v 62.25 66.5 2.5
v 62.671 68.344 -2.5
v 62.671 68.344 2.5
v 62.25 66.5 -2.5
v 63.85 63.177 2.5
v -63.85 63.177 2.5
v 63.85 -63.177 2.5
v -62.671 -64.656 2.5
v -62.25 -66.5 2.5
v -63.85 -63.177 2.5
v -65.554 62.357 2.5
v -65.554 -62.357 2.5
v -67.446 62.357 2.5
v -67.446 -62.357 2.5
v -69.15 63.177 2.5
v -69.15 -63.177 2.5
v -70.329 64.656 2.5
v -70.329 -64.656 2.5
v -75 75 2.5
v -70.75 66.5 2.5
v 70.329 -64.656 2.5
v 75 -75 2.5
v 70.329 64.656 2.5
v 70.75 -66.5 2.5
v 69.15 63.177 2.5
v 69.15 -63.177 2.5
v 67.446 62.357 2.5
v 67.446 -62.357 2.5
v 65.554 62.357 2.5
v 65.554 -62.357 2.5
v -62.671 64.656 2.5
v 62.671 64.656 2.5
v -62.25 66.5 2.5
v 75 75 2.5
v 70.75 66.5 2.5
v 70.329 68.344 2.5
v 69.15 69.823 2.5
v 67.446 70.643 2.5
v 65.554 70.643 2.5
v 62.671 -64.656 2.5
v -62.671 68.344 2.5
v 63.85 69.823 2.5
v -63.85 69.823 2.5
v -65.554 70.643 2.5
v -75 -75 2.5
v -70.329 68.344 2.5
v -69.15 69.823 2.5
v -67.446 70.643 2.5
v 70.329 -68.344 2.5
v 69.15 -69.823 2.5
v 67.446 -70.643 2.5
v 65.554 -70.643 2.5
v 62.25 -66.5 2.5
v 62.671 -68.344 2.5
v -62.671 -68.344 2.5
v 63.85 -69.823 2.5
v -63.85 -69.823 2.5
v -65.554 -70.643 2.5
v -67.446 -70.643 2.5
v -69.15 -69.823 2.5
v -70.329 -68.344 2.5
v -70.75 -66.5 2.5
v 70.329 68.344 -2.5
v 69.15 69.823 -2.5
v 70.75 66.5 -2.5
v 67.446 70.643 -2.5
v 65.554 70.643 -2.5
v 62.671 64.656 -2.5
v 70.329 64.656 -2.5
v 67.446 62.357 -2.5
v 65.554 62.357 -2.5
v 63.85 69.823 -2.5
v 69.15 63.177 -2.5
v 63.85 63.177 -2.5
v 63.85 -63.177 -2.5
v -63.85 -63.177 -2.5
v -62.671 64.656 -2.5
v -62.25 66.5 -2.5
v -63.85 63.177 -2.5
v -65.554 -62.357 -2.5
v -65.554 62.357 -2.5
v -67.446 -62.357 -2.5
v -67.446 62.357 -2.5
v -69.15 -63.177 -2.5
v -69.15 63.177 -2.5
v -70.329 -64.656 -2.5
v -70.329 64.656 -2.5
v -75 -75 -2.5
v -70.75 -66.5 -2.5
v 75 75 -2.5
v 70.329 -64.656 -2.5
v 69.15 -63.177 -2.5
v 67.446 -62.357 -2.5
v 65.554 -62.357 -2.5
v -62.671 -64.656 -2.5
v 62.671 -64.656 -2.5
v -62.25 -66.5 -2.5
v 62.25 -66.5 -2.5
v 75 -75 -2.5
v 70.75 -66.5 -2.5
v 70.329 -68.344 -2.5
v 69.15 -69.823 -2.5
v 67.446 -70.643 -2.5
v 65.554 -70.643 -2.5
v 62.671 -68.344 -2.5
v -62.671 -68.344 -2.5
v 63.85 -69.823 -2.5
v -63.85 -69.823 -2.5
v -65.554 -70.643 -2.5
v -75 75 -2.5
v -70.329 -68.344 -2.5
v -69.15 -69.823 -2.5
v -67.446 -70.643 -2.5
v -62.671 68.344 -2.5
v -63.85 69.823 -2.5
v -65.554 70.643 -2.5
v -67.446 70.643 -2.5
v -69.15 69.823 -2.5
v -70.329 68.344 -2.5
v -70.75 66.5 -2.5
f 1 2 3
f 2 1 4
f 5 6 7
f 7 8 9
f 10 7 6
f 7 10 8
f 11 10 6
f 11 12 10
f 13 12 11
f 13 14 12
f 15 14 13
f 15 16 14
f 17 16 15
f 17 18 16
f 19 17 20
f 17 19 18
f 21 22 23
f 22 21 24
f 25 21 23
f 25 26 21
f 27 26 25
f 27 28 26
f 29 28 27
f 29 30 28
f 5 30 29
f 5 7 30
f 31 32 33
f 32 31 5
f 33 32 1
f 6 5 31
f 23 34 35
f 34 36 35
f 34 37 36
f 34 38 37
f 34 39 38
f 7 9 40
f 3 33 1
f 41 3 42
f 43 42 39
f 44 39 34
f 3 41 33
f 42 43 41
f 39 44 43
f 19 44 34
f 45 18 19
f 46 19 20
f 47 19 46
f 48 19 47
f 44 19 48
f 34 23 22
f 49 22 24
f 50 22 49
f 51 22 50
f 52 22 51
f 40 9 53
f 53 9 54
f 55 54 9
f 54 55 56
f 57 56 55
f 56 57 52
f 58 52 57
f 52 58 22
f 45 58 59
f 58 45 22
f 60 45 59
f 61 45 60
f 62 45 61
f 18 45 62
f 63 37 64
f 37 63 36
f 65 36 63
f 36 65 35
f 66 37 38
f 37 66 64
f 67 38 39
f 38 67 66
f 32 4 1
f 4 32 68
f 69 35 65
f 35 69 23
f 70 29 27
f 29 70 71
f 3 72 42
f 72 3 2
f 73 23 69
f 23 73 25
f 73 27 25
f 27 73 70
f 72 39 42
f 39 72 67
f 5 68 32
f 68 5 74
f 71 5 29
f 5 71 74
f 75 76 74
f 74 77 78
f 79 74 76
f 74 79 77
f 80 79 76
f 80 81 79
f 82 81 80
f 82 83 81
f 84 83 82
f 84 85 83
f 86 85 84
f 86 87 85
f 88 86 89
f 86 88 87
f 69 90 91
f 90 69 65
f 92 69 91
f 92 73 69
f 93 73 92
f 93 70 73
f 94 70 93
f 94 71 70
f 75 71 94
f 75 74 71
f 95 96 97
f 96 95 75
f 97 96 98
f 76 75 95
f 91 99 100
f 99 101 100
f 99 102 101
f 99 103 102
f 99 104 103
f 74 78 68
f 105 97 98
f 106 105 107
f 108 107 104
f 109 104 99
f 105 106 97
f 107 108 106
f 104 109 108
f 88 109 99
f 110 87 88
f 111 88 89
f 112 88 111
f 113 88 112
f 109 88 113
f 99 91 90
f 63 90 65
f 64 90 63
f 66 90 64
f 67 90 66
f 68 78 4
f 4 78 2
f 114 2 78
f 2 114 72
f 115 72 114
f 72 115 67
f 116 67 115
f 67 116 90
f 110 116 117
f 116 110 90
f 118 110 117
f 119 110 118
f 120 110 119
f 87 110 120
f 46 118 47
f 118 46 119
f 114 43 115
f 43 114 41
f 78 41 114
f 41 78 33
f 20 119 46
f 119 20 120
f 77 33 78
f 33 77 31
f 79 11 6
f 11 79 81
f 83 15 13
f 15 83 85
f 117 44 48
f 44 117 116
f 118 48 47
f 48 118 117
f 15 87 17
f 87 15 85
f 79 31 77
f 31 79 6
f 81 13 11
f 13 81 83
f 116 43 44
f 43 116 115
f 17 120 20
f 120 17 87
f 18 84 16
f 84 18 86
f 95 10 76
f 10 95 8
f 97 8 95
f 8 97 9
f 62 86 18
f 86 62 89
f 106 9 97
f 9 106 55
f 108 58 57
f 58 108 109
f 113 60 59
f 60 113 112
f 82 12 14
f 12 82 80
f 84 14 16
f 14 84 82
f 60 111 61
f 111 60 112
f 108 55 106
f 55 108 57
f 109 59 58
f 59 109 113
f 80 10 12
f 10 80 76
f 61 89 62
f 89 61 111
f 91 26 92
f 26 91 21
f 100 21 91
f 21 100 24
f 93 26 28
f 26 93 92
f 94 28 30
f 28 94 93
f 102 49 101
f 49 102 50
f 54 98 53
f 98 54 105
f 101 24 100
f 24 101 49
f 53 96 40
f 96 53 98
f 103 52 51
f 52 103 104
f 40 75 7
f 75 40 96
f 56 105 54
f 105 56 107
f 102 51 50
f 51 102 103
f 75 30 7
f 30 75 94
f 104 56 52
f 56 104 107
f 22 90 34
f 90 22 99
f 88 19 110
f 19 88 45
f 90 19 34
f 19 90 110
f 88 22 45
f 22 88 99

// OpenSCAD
// Generated by SolidPython 1.1.3 on 2024-01-11 21:47:16


difference() {
	cube(center = true, size = [150, 150, 5]);
	union() {
		translate(v = [66.5000000000, 66.5000000000]) {
			cylinder(center = true, h = 5, r = 4.2500000000);
		}
		translate(v = [-66.5000000000, 66.5000000000]) {
			cylinder(center = true, h = 5, r = 4.2500000000);
		}
		translate(v = [-66.5000000000, -66.5000000000]) {
			cylinder(center = true, h = 5, r = 4.2500000000);
		}
		translate(v = [66.5000000000, -66.5000000000]) {
			cylinder(center = true, h = 5, r = 4.2500000000);
		}
	}
}
/***********************************************
*********      SolidPython code:      **********
************************************************
 
import solid
import numpy as np
import numbers
import pudb
from solid.utils import *
import viewscad
import subprocess
import os
import os.path as osp
import math
import sys

chamfer_extrude=solid.import_scad("./chamfer_extrude.scad")
chamfer_extrude=chamfer_extrude.chamfer_extrude
r = viewscad.Renderer(width=800, height=800)

def debug(model,f_name,path="/home/ts/code/projects/mfd/designs/debug"):
    solid.scad_render_to_file(model,osp.join(path,f_name)+".scad")
#generate position list of wells using offset from center
wells_pos_from_center_4 = lambda offset: [[-offset,offset],
                                        [offset, offset],
                                        [-offset, -offset],
                                        [offset, -offset]]
wells_pos_from_center_2 = lambda offset: [[offset,0],
                                        [-offset,0]]

def make_well(dims,shape=None,height=None,dxf=False):
    def circle_cylinder():
        if dxf or (height is None):
            well = solid.circle(r=dims, segments=64)
        else:
            well = solid.cylinder(r=dims, h=height, segments=64, center = True)
        return well
    if dims is None:
        sys.exit("radius needs to be a number")
    if isinstance(dims, numbers.Number):
        well =circle_cylinder()
    elif len(dims)==1:
        if isinstance(dims[1], numbers.Number):
            well =circle_cylinder()
        else:
            sys.exit("radius needs to be a number")
    elif len(dims)==2:
        well = solid.square(dims,center = True)
    elif len(dims)==3:
        well = solid.cube(dims, center = True)
    return well

def wells_top_bottom(center_gap,device_dims=None,shape=None,height=None, positions = None, dxf = False,well_shape=None):
    if well_shape == None:
        well_shape = make_well(device_dims,shape=shape,height=height,dxf=dxf)
    wells = []
    if positions is None:
        offset = radius+radius/2.0
        positions = wells_pos_from_center_2(offset)
    if dxf or (height is None):
        height = 0
    for position in positions:
        if dxf:
            wells.append(solid.translate([position[0],position[1]])(well_shape))
        else:
            wells.append(solid.translate([position[0],position[1],height/2.0])(well_shape))
    return  union()(*wells)

#place wells in four corners 
def four_corner(radius,height=None, positions = None, dxf = False):
    #if well pos not specified set
    #to equally spaced by half radius
    if positions is None:
        offset = radius+radius/2.0
        positions = wells_pos_from_center_4(offset)
    if dxf or (height is None):
        height = 0
    #make wells at positions with specified radius and height
    wells = []
    for position in positions:
        #make circle if making dxf
        if dxf:
            well_shape = solid.circle(r=radius, segments=64)
            well_shape = solid.translate([position[0],position[1]])(well_shape)
        #if stl make cylinder
        else:
            well_shape = solid.cylinder(r=radius, h=height, segments=64, center = True)
            well_shape = solid.translate([position[0],position[1],height/2.0])(well_shape)
        wells.append(well_shape)
    return  union()(*wells)

#generate channels 
def make_channels(length,width,height=0,num_chans=1,max_chans=None,spacing=None, dxf = False,
                  rotate_channels=False):
    if dxf or (height is None):
        height = 0
    #if channel gap not defined, is equal to
    if spacing is None: spacing = width
    #calculate number of channels if fitting max num within given width
    if not max_chans is None:
        import math
        num_chans = math.floor((max_chans-spacing)/(width+spacing))
    #get total width of channel section  
    total_width = (width*num_chans)+(spacing*(num_chans-1))

    #make template channel
    #if rotate_channels: width, length = length, width
    if dxf:
        channel_t = solid.square([length,width],center = True)
    else:
        channel_t = solid.cube([length,width,height], center = True)

    #if number channels is even, offset the first channel to center its gap
    if num_chans % 2 == 0: centering = -(width/2.0+spacing/2.0)
    else: centering = 0
    #move template channel up to align bottom at z = 0 
    #and offset center if necessary
    if dxf:
        channel_t = solid.translate([0,centering])(channel_t)
    else:
        channel_t = solid.translate([0,centering,height/2.0])(channel_t)

    #if rotate_channels: length,width = width,length
    #start making the channels
    channels = []
    for i in range(num_chans):
        #if i=0 there is no translation
        #if i=1, we make the first channel adjacent to second
        direction = i

        #if i>=1, we add channels alternating left and right
        if i >= 1:
            direction = -(i/2.0)
            if i % 2 == 1: direction = (-direction)+0.5
                
        #make channel at right position and add it to channel list
        translation_coords = [0,direction*(width+spacing)]
        #if rotate_channels: translation_coords = [direction*(width+spacing),0]
        if dxf:
            channel = solid.translate(translation_coords)(channel_t)
        else:
            channel = solid.translate([*translation_coords,0])(channel_t)
        channels.append(channel)
    
    #group all channels as one object
    channels = union()(*channels)
    #compute the x,y,z dimensions in order to pass as arguments 
    #for construction of other parts of device (such as the chambers)
    measurements = {'x':(length/2.0,-length/2.0),
                    'y':(total_width/2.0,-total_width/2.0)}
    if not dxf:
        measurements['z'] = (height,0)
    if rotate_channels:
        channels = solid.rotate(90)(channels)
        measurements['x'],measurements['y']=measurements['y'],measurements['x']
    return channels,measurements

def make_chambers(msrs,height=None,extra=0,len_until=None,width=None, dxf = False):
    #computes x,y,z length
    total = lambda x : abs(x[0]) + abs(x[1])
    
    #if specific height if specified
    #otherwise use same height as channels
    if dxf:
        pass
    elif not height is None:
        msrs['z'] = (height,0)
    else:
        msrs['z'] = (0,0)
        
    #make copy of measurements from channels to modify chamber dimensions 
    #and add length to chambers as specified
    chamber_dims = msrs.copy()
    #calculate length of chamber to reach specified offset
    if not len_until is None:
        chamber_len = len_until-(msrs['x'][0])
    #or add specified length to channel length (if not specified, adds 0)
    else:
        chamber_len = msrs['x'][0]+extra
    #set the chamber length based 
    chamber_dims['x'] = (chamber_len/2.0,-(chamber_len/2.0))
    #compute final dimensions of chamber
    if not width is None:
        chamber_dims['y'] = (width/2.0,-width/2.0)
    chamber_dims = [total(size) for size in chamber_dims.values()]
        
    #calculate chamber translation offset to place adjacent to channels
    chamber_trslt = msrs['x'][0]+(chamber_len/2.0)
    #compute chamber translation coordinates to align with channels
    #x = 1 moves chamber above channels
    #x = -1 moves chamber below channels
    if dxf:
        trslt = lambda x : [x*(chamber_trslt),0]
    else:
        trslt = lambda x : [x*(chamber_trslt),0,msrs['z'][0]/2.0]
    
    #function to make chamber at top or at bottom 
    if dxf:
        move = lambda x : solid.translate(trslt(x))(solid.square(chamber_dims, center = True) )
    else:
        move = lambda x : solid.translate(trslt(x))(solid.cube(chamber_dims,center = True))
    #make top and bottom chambers and return them as grouped
    top = move(1)
    bottom = move(-1)
    #chambers=solid.rotate(90)(solid.union()(top,bottom))
    chambers=(solid.union()(top,bottom))

    return chambers

#create alignment features 
def alignment_features(unit,dims,grid_size, mask_size = None, alignment = "hollow", units_from_center = (2.5,2.5), corner_len=None):
    width = grid_size[0]*dims[0]
    length = grid_size[1]*dims[1]
    if mask_size is None and corner_len is None:
        corner_len = (dims[0] + dims[1]) /2 / 8
    corner = lambda thickness_div : solid.union()( solid.square([corner_len,corner_len/thickness_div],center=False), solid.square([corner_len/thickness_div,corner_len],center=False) )
    
    def make_full(thickness_div):
        thickness = corner_len/thickness_div
        tr = solid.translate([0, 0, 0 ])(solid.rotate(180)(corner(thickness_div)))
        tr = solid.translate([thickness/2,thickness/2,0])(tr)
        bl = solid.translate([0, 0, 0 ])(solid.rotate(0)(corner(thickness_div)))
        bl = solid.translate([-thickness/2,-thickness/2,0])(bl)
        return solid.union()(tr,bl)
    
    def make_hollow(thickness_div):
        thickness = corner_len/(thickness_div/2)
        inner = make_full(thickness_div)
        outer = make_full(thickness_div/2)
        hollow = outer - inner 
        return hollow
    
    center = (width /2 , length/2)
    mask_pos = lambda x,y : (center[0] + x*(float(units_from_center[0])*dims[0]), center[1] + y*(float(units_from_center[1])*dims[1]))
    positions = []
    positions.append(mask_pos(1,0))
    positions.append(mask_pos(0,1))
    positions.append(mask_pos(-1,0))
    positions.append(mask_pos(0,-1))
    make_mask = lambda mtype : make_hollow(8) if mtype == "hollow" else make_full(8)
    masks = [ solid.translate([*position,0])(make_mask(alignment)) for position in positions]
    
    solid.scad_render_to_file(solid.union()(*masks),"./designs/open_chamber/masks.scad")
    #return unit - solid.union()(*masks)
    return solid.union()(*masks,unit)

def create_outline(thickness, array, dims, grid_size,):
    width = grid_size[0]*dims[0] + thickness *2
    length = grid_size[1]*dims[1] + thickness *2
    outer = solid.translate([-thickness, -thickness,0])(solid.square([width, length]))
    return outer-array

def create_wall(wall_thickness, outline_thickness, dims, grid_size, wall_height = 2000, dxf = False):
    inner_width = grid_size[0]*dims[0] + outline_thickness *2
    inner_length = grid_size[1]*dims[1] + outline_thickness *2
    outer_width = inner_width + wall_thickness * 2
    outer_length = inner_length + wall_thickness * 2
    outer_pos_x = -outline_thickness-wall_thickness
    outer_pos_y = -outline_thickness-wall_thickness
    inner_pos_x = -outline_thickness
    inner_pos_y = -outline_thickness
    if dxf:
        inner_wall = solid.translate([inner_pos_x,
                                      inner_pos_y,
                                      0])(solid.square([inner_width, inner_length]))
        outer_wall = solid.translate([outer_pos_x,
                                      outer_pos_y,
                                      0])(solid.square([outer_width, outer_length]))

        return outer_wall-inner_wall
    else:
        inner_wall = solid.translate([inner_pos_x,
                                      inner_pos_y,
                                      0])(solid.cube([inner_width, inner_length,wall_height]))
        outer_wall = solid.translate([outer_pos_x,
                                      outer_pos_y,
                                      0])(solid.cube([outer_width, outer_length,wall_height]))

        return outer_wall-inner_wall, {'wall_height': wall_height,
                                       'wall_thickness': wall_thickness,
                                       'inner_width':inner_width,
                                       'inner_length': inner_length,
                                       'outer_width': outer_width,
                                       'outer_length': outer_length,
                                       'outer_pos_x' : outer_pos_x,
                                       'outer_pos_y' : outer_pos_y,
                                       'inner_pos_x' : inner_pos_x,
                                       'inner_pos_y' : inner_pos_y}

def create_thicker_wall(wall_thickness, outer_wall_offset, wall_dims, dims, grid_size, height_start = .2, height_end=2, dxf = False):
    addon_wall,thicker_wall_dims = create_wall(wall_thickness, outer_wall_offset, dims, grid_size, wall_height=height_end-height_start, dxf = False)
    addon_wall = solid.translate([0,0,height_start])(addon_wall)

    thicker_wall_dims['wall_height'] = height_end
    thicker_wall_dims['wall_thickness'] = wall_dims['wall_thickness'] + wall_thickness
    return addon_wall, thicker_wall_dims
 
def add_lock_to_wall(wall,wall_dims,y_offset = 0,cut_ratio=0.7,L_length=3, gap_ratio=0.05, axis="x",width_ratio=1/2):
    # Makes L shape
    def make_L(max_length,length_thickness,max_width,width_thickness,height,y_offset):
        length = solid.cube([max_length,length_thickness,height])
        width = solid.cube([width_thickness,max_width,height])
        width = solid.translate([max_length-(width_thickness),0,0])(width)
        L = solid.union()(width,length)
        debug(L,"L")
        if axis == "x":
            L = solid.rotate(-90)(L)
            L = solid.translate([0,max_length,0])(L)
        else:
            L = solid.rotate(-180)(L)
            L = solid.translate([max_length,max_width,0])(L)
        return solid.translate([0,0,y_offset])(L)
    
    lock_length = L_length
    lock_width = wall_dims['wall_thickness']*width_ratio
    lock_length_thickness = lock_width/2
    lock_width_thickness = lock_width/2
    L_lock = make_L(lock_length,lock_length_thickness,lock_width,lock_width_thickness, wall_dims['wall_height']-y_offset, y_offset)
    
    margin_space = lock_length - lock_length*(1-gap_ratio)
    key_length = lock_length-margin_space
    key_length_thickness = lock_length_thickness-(margin_space*2)
    key_width = lock_width-(margin_space*2)
    key_width_thickness = lock_width_thickness-(margin_space*2)
    L_key = make_L(key_length,key_length_thickness,key_width,key_width_thickness, wall_dims['wall_height']-y_offset, y_offset)
    L_key = solid.translate([margin_space,margin_space,0])(L_key)
    L = solid.union()(L_lock,L_key)
    debug(L,"L")
    
    #Make cube to be used as negative to split frame in a half
    #Can choose if making left or right negative, specify ratio of split
    def make_negative(right,cut_ratio):
        if axis == "x":
            if right:
                length = wall_dims['outer_length']*(1-cut_ratio)
                pos_x = wall_dims['outer_pos_x']+(wall_dims['outer_length']*cut_ratio)
            else:
                length = wall_dims['outer_length']*(cut_ratio)
                pos_x = wall_dims['outer_pos_x'] 
            negative = solid.cube([wall_dims['outer_width'],length, wall_dims['wall_height']])
            negative = solid.translate([wall_dims['outer_pos_y'],pos_x,0])(negative)
        else:
            if right:
                length = wall_dims['outer_width']*(1-cut_ratio)
                pos_x = wall_dims['outer_pos_y']+(wall_dims['outer_width']*cut_ratio)
            else:
                length = wall_dims['outer_width']*(cut_ratio)
                pos_x = wall_dims['outer_pos_y'] 
            negative = solid.cube([length,wall_dims['outer_length'], wall_dims['wall_height']])
            negative = solid.translate([pos_x,wall_dims['outer_pos_x'],0])(negative)
        return negative, pos_x, length 
                      
    #Make negatives
    negative_right, right_half_pos_x, right_half_length = make_negative(True,cut_ratio)
    negative_left, left_half_pos_x, right_half_length = make_negative(False,cut_ratio)
    #Make halves
    left_half = solid.difference()(wall,negative_right)
    right_half = solid.difference()(wall,negative_left)
    def place_L(L, L_length,L_width):
        #Place L on top wall       
        offset_to_center = (wall_dims['wall_thickness']-L_width)/2
        if axis == "x":
            y_pos_top = (wall_dims['outer_pos_y'] +
                    wall_dims['outer_width'] - 
                    L_width - offset_to_center)
            top_L = solid.translate([y_pos_top,
                                     right_half_pos_x-(L_length),
                                     0])(L)
            #Place L on bottom wall       
            y_pos_bottom = wall_dims['outer_pos_y']+offset_to_center
            bottom_L = solid.translate([y_pos_bottom,
                                        right_half_pos_x-L_length,
                                        0])(L)
        else:
            y_pos_top = (wall_dims['outer_pos_x'] +
                    wall_dims['outer_length'] -
                    (L_width+offset_to_center))
            top_L = solid.translate([right_half_pos_x-L_length,
                                     y_pos_top,
                                     0])(L)
            #Place L on bottom wall       
            y_pos_bottom = wall_dims['outer_pos_y']+offset_to_center
            bottom_L = solid.translate([right_half_pos_x-L_length,
                                        y_pos_bottom,
                                        0])(L)
        return bottom_L, top_L
    #Make complimentary L pieces through union and differences
    #Make Lock
    bottom_L_lock, top_L_lock = place_L(L_lock,L_length,lock_width)
    left_half = solid.difference()(left_half,bottom_L_lock)
    left_half = solid.difference()(left_half,top_L_lock)
    #Make Key
    bottom_L_key, top_L_key = place_L(L_key,L_length,lock_width)
    right_half = solid.union()(right_half,bottom_L_key)
    right_half = solid.union()(right_half,top_L_key)
    return left_half, right_half


#build a row x col grid of containment units
def make_unit_array(unit,dims,grid_size, dxf = False, alignment = None, mask_size = None,
                    units_from_center = None,alignment_offset=None, alignment_mark_size=1):
    units = []
    for col in range(grid_size[1]):
        for row in range(grid_size[0]):
            if dxf:
                units.append(solid.translate([row*dims[0],col*dims[1]])(unit))
            else:
                units.append(solid.translate([row*dims[0],col*dims[1],dims[2]/2.0])(unit))
    array = solid.union()(*units)
    if (not alignment is None) and dxf:
        if not alignment_offset is None:
            array = solid.translate([alignment_offset[0],alignment_offset[1]])(array)
        array = alignment_features(array,dims, grid_size, alignment = alignment, mask_size = None, units_from_center = units_from_center,corner_len=alignment_mark_size)
        if not alignment_offset is None:
            array = solid.translate([-alignment_offset[0],-alignment_offset[1]])(array)
    return array


def make_taylor(wells_pos = wells_pos_from_center_4(2.25), well_rad = 1.5 ,
                well_height = 2, chan_w = 0.01, chan_l = 1, chan_h = 0.010 ,
                chan_gap = 0.040, max_chans = None,num_chans=100, chamber_height  = 0.100,
                columns = 1, rows = 1, chamber_len_until=2.25, add_channels = True, add_wells = True, 
                add_chambers = True, save_path = "./", alignment = None, units_from_center = 2,
                mask_size = None, render_stl = False, outline_thickness = 0.050, dxf = True,
                wall_height = 15, wall_thickness = 0.95, casing_x=9, casing_y=9, casing_z=0,rotate_units=0):

    dims = [casing_x, casing_y, casing_z]
    wells = four_corner(well_rad,well_height, dxf = dxf, positions = wells_pos)
    debug(wells,"wells")
    channels, msrs = make_channels(chan_l,chan_w,chan_h,dxf=dxf, spacing = chan_gap, max_chans=max_chans,num_chans=num_chans)
    debug(channels,"channels")
    chambers = make_chambers(msrs,dxf = dxf, height=chamber_height,len_until=chamber_len_until)
    debug(chambers,"chambers")

    #add together and render
    device_parts = []
    if add_channels:
        device_parts.append(channels)
    if add_wells:
        device_parts.append(wells)
    if add_chambers:
        device_parts.append(chambers)
    device=union()(*device_parts)
    device = rotate(rotate_units)(device)

    device=solid.translate([dims[0]/2.0,dims[1]/2.0,0])(device)
    channels = rotate(rotate_units)(channels)
    channels=solid.translate([dims[0]/2,dims[1]/2,0])(channels)
    chambers_wells = union()(wells,chambers)
    chambers_wells = rotate(rotate_units)(chambers_wells)
    chambers_wells=solid.translate([dims[0]/2,dims[1]/2,0])(chambers_wells)

    file_name = str(rows)+'x'+str(columns)+'_units_'
    grid_size = [rows,columns]

    if alignment:
        alignment="full"
    device = make_unit_array(device,dims,grid_size, dxf=dxf, alignment = alignment,
                                 units_from_center = units_from_center)
    channels = make_unit_array(channels,dims,grid_size, dxf=dxf, alignment = alignment,
                                 units_from_center = units_from_center)
    if alignment=="full":
        alignment="hollow"

    chambers_wells = make_unit_array(chambers_wells,dims,grid_size, dxf=dxf, alignment = alignment,
                                 units_from_center =units_from_center)

    def save_model(model,prefix):
        model_fname = os.path.abspath(save_path+prefix+"_"+file_name+".scad")
        solid.scad_render_to_file(model,model_fname)
        return model_fname

    wells_fname = save_model(wells,"wells")
    channels_fname = save_model(channels,"channels")
    device_fname = save_model(device,"device")
    chambers_wells_fname = save_model(chambers_wells,"chambers_wells")
    return (chambers_wells,chambers_wells_fname), (channels,channels_fname), (device,device_fname)

def make_device(design='open',rows=8,columns=6,wells_pos = 4.5,well_offset=3.2, well_rad=3.2,well_height=0.1,
                chan_l=1,chan_w=0.01,chan_h=0.01,chan_gap=0.015,num_chans=101,dxf=True,save_path="./designs/open_chamber/",
                casing_x=9.0,casing_y=18.0,casing_z=0,rotate_units=90,units_from_center=(3,1),chamber_len_until=4.5,
                chamber_width=None,alignment=True, add_wells=True, add_channels=True,add_chambers=True,well_shape=None):

    dims = [casing_x, casing_y, casing_z]
    if design == "open":
        wells_pos=wells_pos_from_center_2(wells_pos)
        wells = wells_top_bottom(well_offset*2,device_dims=well_rad,height=well_height, dxf = dxf, positions = wells_pos,well_shape=well_shape)
    elif design == "closed":
        wells_pos=wells_pos_from_center_4(wells_pos)
        debug(wells,"wells")
        wells = four_corner(well_offset,well_height,device_dims=well_rad, dxf = dxf, positions = wells_pos)
    else:
        print(design+" is not a valid design.\n Choose valid design: 'open' or 'closed'")
        exit()
    wells = rotate(rotate_units)(wells)
    wells=solid.translate([dims[0]/2,dims[1]/2,0])(wells)
    debug(wells,"wells")

    channels, msrs = make_channels(chan_l,chan_w,chan_h,dxf=dxf, spacing = chan_gap, num_chans=num_chans,rotate_channels=False)
    channels = rotate(rotate_units)(channels)
    channels=solid.translate([dims[0]/2,dims[1]/2,0])(channels)

    chambers=make_chambers(msrs,height=None,extra=0,len_until=chamber_len_until, width=chamber_width,dxf = dxf)
    chambers = rotate(rotate_units)(chambers)
    chambers=solid.translate([dims[0]/2,dims[1]/2,0])(chambers)

    device_parts = []
    if add_channels:
        device_parts.append(channels)
    if add_wells:
        device_parts.append(wells)
    if add_chambers:
        device_parts.append(chambers)
    device = union()(*device_parts)
    #device = rotate(rotate_units)(device)
    #device=solid.translate([dims[0]/2.0,dims[1]/2.0,0])(device)

    chambers_wells = []
    if add_chambers:
        chambers_wells.append(chambers)
    if add_wells:
        chambers_wells.append(wells)
    chambers_wells = union()(*chambers_wells)
    #chambers_wells = union()(wells,chambers)
    #chambers_wells = rotate(rotate_units)(chambers_wells)
    #chambers_wells=solid.translate([dims[0]/2,dims[1]/2,0])(chambers_wells)

    file_name = str(rows)+'x'+str(columns)+'_units_'

    grid_size = [rows,columns]
    if alignment:
        alignment="full"
    device = make_unit_array(device,dims,grid_size, dxf=dxf, alignment = alignment,
                                 units_from_center = units_from_center)
    channels = make_unit_array(channels,dims,grid_size, dxf=dxf, alignment = alignment,
                                 units_from_center = units_from_center)
    if alignment=="full":
        alignment="hollow"

    chambers_wells = make_unit_array(chambers_wells,dims,grid_size, dxf=dxf, alignment = alignment,
                                 units_from_center =units_from_center)

    def save_model(model,prefix):
        model_fname = os.path.abspath(save_path+prefix+"_"+file_name+".scad")
        solid.scad_render_to_file(model,model_fname)
        return model_fname

    wells_fname = save_model(wells,"wells")
    channels_fname = save_model(channels,"channels")
    device_fname = save_model(device,"device")
    chambers_wells_fname = save_model(chambers_wells,"chambers_wells")
    return (chambers_wells,chambers_wells_fname), (channels,channels_fname), (device,device_fname)


def make_open_chamber(rows=8,columns=6,wells_pos = wells_pos_from_center_2(4.5), well_rad=3.2,well_height=0.1,
                      chan_l=1,chan_w=0.01,chan_h=0.01,chan_gap=0.015,num_chans=101,dxf=True,save_path="./designs/open_chamber/",
                      casing_x=9.0,casing_y=18.0,casing_z=0,rotate_units=90,units_from_center=(3,1),chamber_len_until=4.5,
                      chamber_width=None,alignment=True, add_wells=True, add_channels=True,add_chambers=True,well_shape=None):

    dims = [casing_x, casing_y, casing_z]
    wells = wells_top_bottom(well_rad,height=well_height, dxf = dxf, positions = wells_pos, well_shape=well_shape)
    channels, msrs = make_channels(chan_l,chan_w,chan_h,dxf=dxf, spacing = chan_gap, num_chans=num_chans,rotate_channels=False)
    chambers=make_chambers(msrs,height=None,extra=0,len_until=chamber_len_until, width=chamber_width,dxf = dxf)
    debug(chambers,"chambers")
    device_parts = []
    if add_channels:
        device_parts.append(channels)
    if add_wells:
        device_parts.append(wells)
    if add_chambers:
        device_parts.append(chambers)
    device = union()(*device_parts)
    device = rotate(rotate_units)(device)
    device=solid.translate([dims[0]/2.0,dims[1]/2.0,0])(device)
    channels = rotate(rotate_units)(channels)
    channels=solid.translate([dims[0]/2,dims[1]/2,0])(channels)
    chambers_wells = union()(wells,chambers)
    chambers_wells = rotate(rotate_units)(chambers_wells)
    chambers_wells=solid.translate([dims[0]/2,dims[1]/2,0])(chambers_wells)

    file_name = str(rows)+'x'+str(columns)+'_units_'

    grid_size = [rows,columns]
    if alignment:
        alignment="full"
    device = make_unit_array(device,dims,grid_size, dxf=dxf, alignment = alignment,
                                 units_from_center = units_from_center)
    channels = make_unit_array(channels,dims,grid_size, dxf=dxf, alignment = alignment,
                                 units_from_center = units_from_center)
    if alignment=="full":
        alignment="hollow"

    chambers_wells = make_unit_array(chambers_wells,dims,grid_size, dxf=dxf, alignment = alignment,
                                 units_from_center =units_from_center)

    def save_model(model,prefix):
        model_fname = os.path.abspath(save_path+prefix+"_"+file_name+".scad")
        solid.scad_render_to_file(model,model_fname)
        return model_fname

    wells_fname = save_model(wells,"wells")
    channels_fname = save_model(channels,"channels")
    device_fname = save_model(device,"device")
    chambers_wells_fname = save_model(chambers_wells,"chambers_wells")
    return (chambers_wells,chambers_wells_fname), (channels,channels_fname), (device,device_fname)

def to_dxf(scad_path):
    dxf_path = scad_path.replace(".scad",".dxf")
    subprocess.call(["openscad", "-o", dxf_path, scad_path])
    import ezdxf
    temp_dxf = ezdxf.readfile(dxf_path)
    temp_dxf.saveas(dxf_path)

#def make_walls(diameter,thickness,grid_size,dims,height=20,segments=256,make_inner=True):
#    wafer_wall_out = solid.cylinder(r=diameter/2,h=height, segments=segments)
#    wafer_wall_in = solid.cylinder(r=(diameter/2-thickness),h=height, segments=segments)
#    wafer_wall = solid.difference()(wafer_wall_out,wafer_wall_in)
#    wafer_wall = solid.translate([grid_size[1]*dims[1]/2.0,grid_size[0]*dims[0]/2.0])(wafer_wall)
#
#    vertical_wall_length = grid_size[1]*dims[1]
#    horizontal_wall_length = grid_size[0]*dims[0]
#    vertical_wall = solid.cube([vertical_wall_length,thickness,height],center = True)
#    vertical_wall = solid.translate([vertical_wall_length/2,0,height/2])(vertical_wall)
#    horizontal_wall = solid.cube([thickness,horizontal_wall_length,height],center = True)
#    horizontal_wall = solid.translate([0,vertical_wall_length/2,height/2])(horizontal_wall)
#    walls = []
#    walls.append(horizontal_wall)
#    walls.append(vertical_wall)
#    for col in range(grid_size[1]):
#        if col == grid_size[1]-1: 
#            walls.append(solid.translate([0,(col+1)*dims[1]])(vertical_wall))
#        elif col > 0 and col < grid_size[1]-1 and make_inner==True:
#            walls.append(solid.translate([0,(col+1)*dims[1]])(vertical_wall))
#    for row in range(grid_size[0]):
#        if row == grid_size[0]-1: 
#            walls.append(solid.translate([(row+1)*dims[0],0])(horizontal_wall))
#        elif row > 0 and row < grid_size[0]-1 and make_inner==True:
#            walls.append(solid.translate([(row+1)*dims[0],0])(horizontal_wall))
#    walls = union()(*walls)
#    wafer_walls = union()(walls,wafer_wall)
#    return walls,wafer_wall,wafer_walls

def make_walls(diameter,thickness,grid_size,dims,height=20,segments=256,make_inner=True,padx=0,pady=0):
    wafer_wall_out = solid.cylinder(r=diameter/2,h=height, segments=segments)
    wafer_wall_in = solid.cylinder(r=(diameter/2-thickness),h=height, segments=segments)
    wafer_wall = solid.difference()(wafer_wall_out,wafer_wall_in)
    wafer_wall = solid.translate([grid_size[1]*dims[1]/2.0,grid_size[0]*dims[0]/2.0])(wafer_wall)

    vertical_wall_length = grid_size[0]*dims[0]+padx
    horizontal_wall_length = grid_size[1]*dims[1]+pady
    vertical_wall = solid.cube([vertical_wall_length,thickness,height],center = True)
    vertical_wall = solid.translate([vertical_wall_length/2-pady/2,-padx/2,height/2])(vertical_wall)
    horizontal_wall = solid.cube([thickness,horizontal_wall_length,height],center = True)
    horizontal_wall = solid.translate([-pady/2,horizontal_wall_length/2-padx/2,height/2])(horizontal_wall)
    walls = []
    walls.append(horizontal_wall)
    walls.append(vertical_wall)
    for col in range(grid_size[1]):
        if col == grid_size[1]-1: 
            walls.append(solid.translate([0,(col+1)*dims[1]+pady])(vertical_wall))
        elif col > 0 and col < grid_size[1]-1 and make_inner==True:
            walls.append(solid.translate([0,(col+1)*dims[1]])(vertical_wall))
    for row in range(grid_size[0]):
        if row == grid_size[0]-1: 
            walls.append(solid.translate([(row+1)*dims[0]+padx,0])(horizontal_wall))
        elif row > 0 and row < grid_size[0]-1 and make_inner==True:
            walls.append(solid.translate([(row+1)*dims[0],0])(horizontal_wall))
    walls = union()(*walls)
    wafer_walls = union()(walls,wafer_wall)
    return walls,wafer_wall,wafer_walls

def save_model(model,base_path,base_name,dxf=True):
    if not os.path.exists(base_path):
        os.makedirs(base_path)
    dxf_path=osp.join(base_path,base_name+".scad")
    solid.scad_render_to_file(model,osp.join(dxf_path))
    if dxf:
        to_dxf(dxf_path)

def make_wafer(diameter,flat_len,thickness):
    wafer = solid.cylinder(r1=diameter/2,r2=diameter/2,h=thickness,segments=512,)()
    x_start_flat=(flat_len/2)
    y_start_flat = math.sqrt(((diameter/2)**2) - (x_start_flat**2) )
    height_delete_flat=diameter/2-y_start_flat
    flat_delete = solid.cube([flat_len,height_delete_flat,thickness],center=False)()
    flat_delete = solid.translate([-flat_len/2,y_start_flat,0])(flat_delete)
    wafer = solid.difference()(wafer,flat_delete)
    wafer = solid.rotate(90)(wafer)
    return wafer

def add_wafer_to_mask(wafer_size,flat_len,mask,grid_size,dims,wafer_line_thickness=0.1,outer_mask_thickness=5,alignment_offset=None):
    def make_wafer_mask(wafer_size,flat_len):
        wafer_mask = make_wafer(wafer_size,flat_len,1)
        wafer_mask = solid.projection()(wafer_mask)
        wafer_mask = solid.translate([grid_size[0]*dims[0]/2.0,grid_size[1]*dims[1]/2.0])(wafer_mask)
        if not alignment_offset is None:
            wafer_mask = solid.translate([-alignment_offset[0],-alignment_offset[1]])(wafer_mask)
        return wafer_mask

    inner_wafer_line_mask = make_wafer_mask(wafer_size-wafer_line_thickness/2,flat_len)
    outer_wafer_line_mask = make_wafer_mask(wafer_size+wafer_line_thickness/2,flat_len)
    outer_wafer_mask = make_wafer_mask(wafer_size+outer_mask_thickness,flat_len)
    outer_wafer_mask = solid.difference()(outer_wafer_mask,outer_wafer_line_mask)
    wafer_mask = solid.union()(outer_wafer_mask,inner_wafer_line_mask)

    return solid.difference()(wafer_mask,mask)

def make_posts(post_shape,post_height):
    posts = solid.linear_extrude(height=post_height)(post_shape)
    return posts

def make_wafer_empty(diameter,flat_len,thickness,margin,notch_len=20,notch_height=5,oversize=1.01):
    diameter*=oversize
    flat_len*=oversize
    wafer = make_wafer(diameter,flat_len,thickness)
    holder = solid.cylinder(r1=diameter/2+margin,r2=diameter/2+margin,h=thickness,segments=512)()
    holder = solid.difference()(holder,wafer)

    x_start_flat=(flat_len/2)
    y_start_flat = math.sqrt(((diameter/2)**2) - (x_start_flat**2) )
    height_delete_flat=diameter/2-y_start_flat
    notch = solid.cube([notch_len,notch_height,thickness],center=False)()
    notch = solid.translate([-notch_len/2,y_start_flat,0])(notch)
    notch = solid.rotate(90)(notch)
    return solid.difference()(holder,notch)

def wafer_print_calibration(diameter,thickness,height,z_offset):
    circles = []
    radii = []
    radii.append(diameter/2.0*0.8)
    radii.append(diameter/2.0*0.6)
    radii.append(diameter/2.0*0.4)
    radii.append(diameter/2.0*0.2)
    for radius in radii:
        inner = solid.cylinder(r1=radius-(thickness/2.0),r2=radius-(thickness/2.0),h=thickness,segments=512,)()
        outer = solid.cylinder(r1=radius+(thickness/2.0),r2=radius+(thickness/2.0),h=thickness,segments=512,)()
        diff = solid.difference()(outer,inner)
        circles.append(diff)
    circles = solid.union()(*circles)
    circles = solid.translate([0,0,z_offset])(circles)
    return circles

def make_rack(wells,dims,grid_size,alignment_offset,rack_x,rack_y,rack_thickness,bolt_width,add_bolts=True):

    #get X and Y dimensions of gride of pipette tips
    X_len = dims[0]*grid_size[0]
    Y_len = dims[1]*grid_size[1]
    #make rack
    rack = solid.cube([rack_x,rack_y,rack_thickness],center=True)

    if add_bolts:
    #add bolt holes
        bolt_hole=solid.cylinder(r=bolt_width/2,h=rack_thickness,center=True)()
        bolt_holes = []
        bolt_holes.append(solid.translate([rack_x/2-1.5*bolt_width,rack_y/2-1.5*bolt_width])(bolt_hole))
        bolt_holes.append(solid.translate([-rack_x/2+1.5*bolt_width,rack_y/2-1.5*bolt_width])(bolt_hole))
        bolt_holes.append(solid.translate([-rack_x/2+1.5*bolt_width,-rack_y/2+1.5*bolt_width])(bolt_hole))
        bolt_holes.append(solid.translate([rack_x/2-1.5*bolt_width,-rack_y/2+1.5*bolt_width])(bolt_hole))
        bolt_holes = solid.union()(*bolt_holes)
        rack=solid.difference()(rack,bolt_holes)
    rack_support = rack

    #center rack with pipette holes
    rack = solid.translate([0,0,rack_thickness/2])(rack)
    rack = solid.translate([X_len/2,Y_len/2])(rack)
    rack = solid.translate([-alignment_offset[0],-alignment_offset[1]])(rack)
    wells = solid.linear_extrude(height=rack_thickness)(wells)
    rack = solid.difference()(rack,wells)
    return rack, rack_support

def make_pillar(wells,dims,grid_size,alignment_offset,rack_x,rack_y,pillar_height,rack_thickness,bolt_width,add_bolts=True,taper_angle=1,bolt_position_corner=1.5):

    #get X and Y dimensions of gride of pipette tips
    X_len = dims[0]*grid_size[0]
    Y_len = dims[1]*grid_size[1]
    #make rack
    rack = solid.cube([rack_x,rack_y,rack_thickness],center=True)
    
    if add_bolts:
    #add bolt holes
        bolt_hole=solid.cylinder(r=bolt_width/2,h=rack_thickness,center=True)()
        bolt_holes = []
        bolt_holes.append(solid.translate([rack_x/2-bolt_position_corner*bolt_width,rack_y/2-bolt_position_corner*bolt_width])(bolt_hole))
        bolt_holes.append(solid.translate([-rack_x/2+bolt_position_corner*bolt_width,rack_y/2-bolt_position_corner*bolt_width])(bolt_hole))
        bolt_holes.append(solid.translate([-rack_x/2+bolt_position_corner*bolt_width,-rack_y/2+bolt_position_corner*bolt_width])(bolt_hole))
        bolt_holes.append(solid.translate([rack_x/2-bolt_position_corner*bolt_width,-rack_y/2+bolt_position_corner*bolt_width])(bolt_hole))
        bolt_holes = solid.union()(*bolt_holes)
        rack=solid.difference()(rack,bolt_holes)
    rack_support = rack

    #center rack with pipette holes
    #rack = solid.translate([0,0,-rack_thickness])(rack)
    rack = solid.translate([X_len/2,Y_len/2])(rack)
    rack = solid.translate([-alignment_offset[0],-alignment_offset[1]])(rack)
    if not taper_angle == 0:
        wells=chamfer_extrude(pillar_height,taper_angle,segments=20)(wells)
    else:
        wells = solid.linear_extrude(height=pillar_height)(wells)
    rack = solid.union()(rack,wells)
    return rack, rack_support

def deg_taper_len(height,deg):
    if not deg == 0:
        return height*math.tan(math.radians(deg))
    else:
        return 0

def make_outline(inner_dims,wall_thickness,grid_size,dims,alignment_offset):
    inner_dims=np.array(inner_dims)
    inner_outline=solid.square(inner_dims,center=True)
    outer_dims=inner_dims+wall_thickness
    outer_outline=solid.square(outer_dims,center=True)
    outline=solid.difference()(outer_outline,inner_outline)
    outline=solid.translate([grid_size[0]*dims[0]/2.0,grid_size[1]*dims[1]/2.0])(outline)
    return outline








 
 
************************************************/
